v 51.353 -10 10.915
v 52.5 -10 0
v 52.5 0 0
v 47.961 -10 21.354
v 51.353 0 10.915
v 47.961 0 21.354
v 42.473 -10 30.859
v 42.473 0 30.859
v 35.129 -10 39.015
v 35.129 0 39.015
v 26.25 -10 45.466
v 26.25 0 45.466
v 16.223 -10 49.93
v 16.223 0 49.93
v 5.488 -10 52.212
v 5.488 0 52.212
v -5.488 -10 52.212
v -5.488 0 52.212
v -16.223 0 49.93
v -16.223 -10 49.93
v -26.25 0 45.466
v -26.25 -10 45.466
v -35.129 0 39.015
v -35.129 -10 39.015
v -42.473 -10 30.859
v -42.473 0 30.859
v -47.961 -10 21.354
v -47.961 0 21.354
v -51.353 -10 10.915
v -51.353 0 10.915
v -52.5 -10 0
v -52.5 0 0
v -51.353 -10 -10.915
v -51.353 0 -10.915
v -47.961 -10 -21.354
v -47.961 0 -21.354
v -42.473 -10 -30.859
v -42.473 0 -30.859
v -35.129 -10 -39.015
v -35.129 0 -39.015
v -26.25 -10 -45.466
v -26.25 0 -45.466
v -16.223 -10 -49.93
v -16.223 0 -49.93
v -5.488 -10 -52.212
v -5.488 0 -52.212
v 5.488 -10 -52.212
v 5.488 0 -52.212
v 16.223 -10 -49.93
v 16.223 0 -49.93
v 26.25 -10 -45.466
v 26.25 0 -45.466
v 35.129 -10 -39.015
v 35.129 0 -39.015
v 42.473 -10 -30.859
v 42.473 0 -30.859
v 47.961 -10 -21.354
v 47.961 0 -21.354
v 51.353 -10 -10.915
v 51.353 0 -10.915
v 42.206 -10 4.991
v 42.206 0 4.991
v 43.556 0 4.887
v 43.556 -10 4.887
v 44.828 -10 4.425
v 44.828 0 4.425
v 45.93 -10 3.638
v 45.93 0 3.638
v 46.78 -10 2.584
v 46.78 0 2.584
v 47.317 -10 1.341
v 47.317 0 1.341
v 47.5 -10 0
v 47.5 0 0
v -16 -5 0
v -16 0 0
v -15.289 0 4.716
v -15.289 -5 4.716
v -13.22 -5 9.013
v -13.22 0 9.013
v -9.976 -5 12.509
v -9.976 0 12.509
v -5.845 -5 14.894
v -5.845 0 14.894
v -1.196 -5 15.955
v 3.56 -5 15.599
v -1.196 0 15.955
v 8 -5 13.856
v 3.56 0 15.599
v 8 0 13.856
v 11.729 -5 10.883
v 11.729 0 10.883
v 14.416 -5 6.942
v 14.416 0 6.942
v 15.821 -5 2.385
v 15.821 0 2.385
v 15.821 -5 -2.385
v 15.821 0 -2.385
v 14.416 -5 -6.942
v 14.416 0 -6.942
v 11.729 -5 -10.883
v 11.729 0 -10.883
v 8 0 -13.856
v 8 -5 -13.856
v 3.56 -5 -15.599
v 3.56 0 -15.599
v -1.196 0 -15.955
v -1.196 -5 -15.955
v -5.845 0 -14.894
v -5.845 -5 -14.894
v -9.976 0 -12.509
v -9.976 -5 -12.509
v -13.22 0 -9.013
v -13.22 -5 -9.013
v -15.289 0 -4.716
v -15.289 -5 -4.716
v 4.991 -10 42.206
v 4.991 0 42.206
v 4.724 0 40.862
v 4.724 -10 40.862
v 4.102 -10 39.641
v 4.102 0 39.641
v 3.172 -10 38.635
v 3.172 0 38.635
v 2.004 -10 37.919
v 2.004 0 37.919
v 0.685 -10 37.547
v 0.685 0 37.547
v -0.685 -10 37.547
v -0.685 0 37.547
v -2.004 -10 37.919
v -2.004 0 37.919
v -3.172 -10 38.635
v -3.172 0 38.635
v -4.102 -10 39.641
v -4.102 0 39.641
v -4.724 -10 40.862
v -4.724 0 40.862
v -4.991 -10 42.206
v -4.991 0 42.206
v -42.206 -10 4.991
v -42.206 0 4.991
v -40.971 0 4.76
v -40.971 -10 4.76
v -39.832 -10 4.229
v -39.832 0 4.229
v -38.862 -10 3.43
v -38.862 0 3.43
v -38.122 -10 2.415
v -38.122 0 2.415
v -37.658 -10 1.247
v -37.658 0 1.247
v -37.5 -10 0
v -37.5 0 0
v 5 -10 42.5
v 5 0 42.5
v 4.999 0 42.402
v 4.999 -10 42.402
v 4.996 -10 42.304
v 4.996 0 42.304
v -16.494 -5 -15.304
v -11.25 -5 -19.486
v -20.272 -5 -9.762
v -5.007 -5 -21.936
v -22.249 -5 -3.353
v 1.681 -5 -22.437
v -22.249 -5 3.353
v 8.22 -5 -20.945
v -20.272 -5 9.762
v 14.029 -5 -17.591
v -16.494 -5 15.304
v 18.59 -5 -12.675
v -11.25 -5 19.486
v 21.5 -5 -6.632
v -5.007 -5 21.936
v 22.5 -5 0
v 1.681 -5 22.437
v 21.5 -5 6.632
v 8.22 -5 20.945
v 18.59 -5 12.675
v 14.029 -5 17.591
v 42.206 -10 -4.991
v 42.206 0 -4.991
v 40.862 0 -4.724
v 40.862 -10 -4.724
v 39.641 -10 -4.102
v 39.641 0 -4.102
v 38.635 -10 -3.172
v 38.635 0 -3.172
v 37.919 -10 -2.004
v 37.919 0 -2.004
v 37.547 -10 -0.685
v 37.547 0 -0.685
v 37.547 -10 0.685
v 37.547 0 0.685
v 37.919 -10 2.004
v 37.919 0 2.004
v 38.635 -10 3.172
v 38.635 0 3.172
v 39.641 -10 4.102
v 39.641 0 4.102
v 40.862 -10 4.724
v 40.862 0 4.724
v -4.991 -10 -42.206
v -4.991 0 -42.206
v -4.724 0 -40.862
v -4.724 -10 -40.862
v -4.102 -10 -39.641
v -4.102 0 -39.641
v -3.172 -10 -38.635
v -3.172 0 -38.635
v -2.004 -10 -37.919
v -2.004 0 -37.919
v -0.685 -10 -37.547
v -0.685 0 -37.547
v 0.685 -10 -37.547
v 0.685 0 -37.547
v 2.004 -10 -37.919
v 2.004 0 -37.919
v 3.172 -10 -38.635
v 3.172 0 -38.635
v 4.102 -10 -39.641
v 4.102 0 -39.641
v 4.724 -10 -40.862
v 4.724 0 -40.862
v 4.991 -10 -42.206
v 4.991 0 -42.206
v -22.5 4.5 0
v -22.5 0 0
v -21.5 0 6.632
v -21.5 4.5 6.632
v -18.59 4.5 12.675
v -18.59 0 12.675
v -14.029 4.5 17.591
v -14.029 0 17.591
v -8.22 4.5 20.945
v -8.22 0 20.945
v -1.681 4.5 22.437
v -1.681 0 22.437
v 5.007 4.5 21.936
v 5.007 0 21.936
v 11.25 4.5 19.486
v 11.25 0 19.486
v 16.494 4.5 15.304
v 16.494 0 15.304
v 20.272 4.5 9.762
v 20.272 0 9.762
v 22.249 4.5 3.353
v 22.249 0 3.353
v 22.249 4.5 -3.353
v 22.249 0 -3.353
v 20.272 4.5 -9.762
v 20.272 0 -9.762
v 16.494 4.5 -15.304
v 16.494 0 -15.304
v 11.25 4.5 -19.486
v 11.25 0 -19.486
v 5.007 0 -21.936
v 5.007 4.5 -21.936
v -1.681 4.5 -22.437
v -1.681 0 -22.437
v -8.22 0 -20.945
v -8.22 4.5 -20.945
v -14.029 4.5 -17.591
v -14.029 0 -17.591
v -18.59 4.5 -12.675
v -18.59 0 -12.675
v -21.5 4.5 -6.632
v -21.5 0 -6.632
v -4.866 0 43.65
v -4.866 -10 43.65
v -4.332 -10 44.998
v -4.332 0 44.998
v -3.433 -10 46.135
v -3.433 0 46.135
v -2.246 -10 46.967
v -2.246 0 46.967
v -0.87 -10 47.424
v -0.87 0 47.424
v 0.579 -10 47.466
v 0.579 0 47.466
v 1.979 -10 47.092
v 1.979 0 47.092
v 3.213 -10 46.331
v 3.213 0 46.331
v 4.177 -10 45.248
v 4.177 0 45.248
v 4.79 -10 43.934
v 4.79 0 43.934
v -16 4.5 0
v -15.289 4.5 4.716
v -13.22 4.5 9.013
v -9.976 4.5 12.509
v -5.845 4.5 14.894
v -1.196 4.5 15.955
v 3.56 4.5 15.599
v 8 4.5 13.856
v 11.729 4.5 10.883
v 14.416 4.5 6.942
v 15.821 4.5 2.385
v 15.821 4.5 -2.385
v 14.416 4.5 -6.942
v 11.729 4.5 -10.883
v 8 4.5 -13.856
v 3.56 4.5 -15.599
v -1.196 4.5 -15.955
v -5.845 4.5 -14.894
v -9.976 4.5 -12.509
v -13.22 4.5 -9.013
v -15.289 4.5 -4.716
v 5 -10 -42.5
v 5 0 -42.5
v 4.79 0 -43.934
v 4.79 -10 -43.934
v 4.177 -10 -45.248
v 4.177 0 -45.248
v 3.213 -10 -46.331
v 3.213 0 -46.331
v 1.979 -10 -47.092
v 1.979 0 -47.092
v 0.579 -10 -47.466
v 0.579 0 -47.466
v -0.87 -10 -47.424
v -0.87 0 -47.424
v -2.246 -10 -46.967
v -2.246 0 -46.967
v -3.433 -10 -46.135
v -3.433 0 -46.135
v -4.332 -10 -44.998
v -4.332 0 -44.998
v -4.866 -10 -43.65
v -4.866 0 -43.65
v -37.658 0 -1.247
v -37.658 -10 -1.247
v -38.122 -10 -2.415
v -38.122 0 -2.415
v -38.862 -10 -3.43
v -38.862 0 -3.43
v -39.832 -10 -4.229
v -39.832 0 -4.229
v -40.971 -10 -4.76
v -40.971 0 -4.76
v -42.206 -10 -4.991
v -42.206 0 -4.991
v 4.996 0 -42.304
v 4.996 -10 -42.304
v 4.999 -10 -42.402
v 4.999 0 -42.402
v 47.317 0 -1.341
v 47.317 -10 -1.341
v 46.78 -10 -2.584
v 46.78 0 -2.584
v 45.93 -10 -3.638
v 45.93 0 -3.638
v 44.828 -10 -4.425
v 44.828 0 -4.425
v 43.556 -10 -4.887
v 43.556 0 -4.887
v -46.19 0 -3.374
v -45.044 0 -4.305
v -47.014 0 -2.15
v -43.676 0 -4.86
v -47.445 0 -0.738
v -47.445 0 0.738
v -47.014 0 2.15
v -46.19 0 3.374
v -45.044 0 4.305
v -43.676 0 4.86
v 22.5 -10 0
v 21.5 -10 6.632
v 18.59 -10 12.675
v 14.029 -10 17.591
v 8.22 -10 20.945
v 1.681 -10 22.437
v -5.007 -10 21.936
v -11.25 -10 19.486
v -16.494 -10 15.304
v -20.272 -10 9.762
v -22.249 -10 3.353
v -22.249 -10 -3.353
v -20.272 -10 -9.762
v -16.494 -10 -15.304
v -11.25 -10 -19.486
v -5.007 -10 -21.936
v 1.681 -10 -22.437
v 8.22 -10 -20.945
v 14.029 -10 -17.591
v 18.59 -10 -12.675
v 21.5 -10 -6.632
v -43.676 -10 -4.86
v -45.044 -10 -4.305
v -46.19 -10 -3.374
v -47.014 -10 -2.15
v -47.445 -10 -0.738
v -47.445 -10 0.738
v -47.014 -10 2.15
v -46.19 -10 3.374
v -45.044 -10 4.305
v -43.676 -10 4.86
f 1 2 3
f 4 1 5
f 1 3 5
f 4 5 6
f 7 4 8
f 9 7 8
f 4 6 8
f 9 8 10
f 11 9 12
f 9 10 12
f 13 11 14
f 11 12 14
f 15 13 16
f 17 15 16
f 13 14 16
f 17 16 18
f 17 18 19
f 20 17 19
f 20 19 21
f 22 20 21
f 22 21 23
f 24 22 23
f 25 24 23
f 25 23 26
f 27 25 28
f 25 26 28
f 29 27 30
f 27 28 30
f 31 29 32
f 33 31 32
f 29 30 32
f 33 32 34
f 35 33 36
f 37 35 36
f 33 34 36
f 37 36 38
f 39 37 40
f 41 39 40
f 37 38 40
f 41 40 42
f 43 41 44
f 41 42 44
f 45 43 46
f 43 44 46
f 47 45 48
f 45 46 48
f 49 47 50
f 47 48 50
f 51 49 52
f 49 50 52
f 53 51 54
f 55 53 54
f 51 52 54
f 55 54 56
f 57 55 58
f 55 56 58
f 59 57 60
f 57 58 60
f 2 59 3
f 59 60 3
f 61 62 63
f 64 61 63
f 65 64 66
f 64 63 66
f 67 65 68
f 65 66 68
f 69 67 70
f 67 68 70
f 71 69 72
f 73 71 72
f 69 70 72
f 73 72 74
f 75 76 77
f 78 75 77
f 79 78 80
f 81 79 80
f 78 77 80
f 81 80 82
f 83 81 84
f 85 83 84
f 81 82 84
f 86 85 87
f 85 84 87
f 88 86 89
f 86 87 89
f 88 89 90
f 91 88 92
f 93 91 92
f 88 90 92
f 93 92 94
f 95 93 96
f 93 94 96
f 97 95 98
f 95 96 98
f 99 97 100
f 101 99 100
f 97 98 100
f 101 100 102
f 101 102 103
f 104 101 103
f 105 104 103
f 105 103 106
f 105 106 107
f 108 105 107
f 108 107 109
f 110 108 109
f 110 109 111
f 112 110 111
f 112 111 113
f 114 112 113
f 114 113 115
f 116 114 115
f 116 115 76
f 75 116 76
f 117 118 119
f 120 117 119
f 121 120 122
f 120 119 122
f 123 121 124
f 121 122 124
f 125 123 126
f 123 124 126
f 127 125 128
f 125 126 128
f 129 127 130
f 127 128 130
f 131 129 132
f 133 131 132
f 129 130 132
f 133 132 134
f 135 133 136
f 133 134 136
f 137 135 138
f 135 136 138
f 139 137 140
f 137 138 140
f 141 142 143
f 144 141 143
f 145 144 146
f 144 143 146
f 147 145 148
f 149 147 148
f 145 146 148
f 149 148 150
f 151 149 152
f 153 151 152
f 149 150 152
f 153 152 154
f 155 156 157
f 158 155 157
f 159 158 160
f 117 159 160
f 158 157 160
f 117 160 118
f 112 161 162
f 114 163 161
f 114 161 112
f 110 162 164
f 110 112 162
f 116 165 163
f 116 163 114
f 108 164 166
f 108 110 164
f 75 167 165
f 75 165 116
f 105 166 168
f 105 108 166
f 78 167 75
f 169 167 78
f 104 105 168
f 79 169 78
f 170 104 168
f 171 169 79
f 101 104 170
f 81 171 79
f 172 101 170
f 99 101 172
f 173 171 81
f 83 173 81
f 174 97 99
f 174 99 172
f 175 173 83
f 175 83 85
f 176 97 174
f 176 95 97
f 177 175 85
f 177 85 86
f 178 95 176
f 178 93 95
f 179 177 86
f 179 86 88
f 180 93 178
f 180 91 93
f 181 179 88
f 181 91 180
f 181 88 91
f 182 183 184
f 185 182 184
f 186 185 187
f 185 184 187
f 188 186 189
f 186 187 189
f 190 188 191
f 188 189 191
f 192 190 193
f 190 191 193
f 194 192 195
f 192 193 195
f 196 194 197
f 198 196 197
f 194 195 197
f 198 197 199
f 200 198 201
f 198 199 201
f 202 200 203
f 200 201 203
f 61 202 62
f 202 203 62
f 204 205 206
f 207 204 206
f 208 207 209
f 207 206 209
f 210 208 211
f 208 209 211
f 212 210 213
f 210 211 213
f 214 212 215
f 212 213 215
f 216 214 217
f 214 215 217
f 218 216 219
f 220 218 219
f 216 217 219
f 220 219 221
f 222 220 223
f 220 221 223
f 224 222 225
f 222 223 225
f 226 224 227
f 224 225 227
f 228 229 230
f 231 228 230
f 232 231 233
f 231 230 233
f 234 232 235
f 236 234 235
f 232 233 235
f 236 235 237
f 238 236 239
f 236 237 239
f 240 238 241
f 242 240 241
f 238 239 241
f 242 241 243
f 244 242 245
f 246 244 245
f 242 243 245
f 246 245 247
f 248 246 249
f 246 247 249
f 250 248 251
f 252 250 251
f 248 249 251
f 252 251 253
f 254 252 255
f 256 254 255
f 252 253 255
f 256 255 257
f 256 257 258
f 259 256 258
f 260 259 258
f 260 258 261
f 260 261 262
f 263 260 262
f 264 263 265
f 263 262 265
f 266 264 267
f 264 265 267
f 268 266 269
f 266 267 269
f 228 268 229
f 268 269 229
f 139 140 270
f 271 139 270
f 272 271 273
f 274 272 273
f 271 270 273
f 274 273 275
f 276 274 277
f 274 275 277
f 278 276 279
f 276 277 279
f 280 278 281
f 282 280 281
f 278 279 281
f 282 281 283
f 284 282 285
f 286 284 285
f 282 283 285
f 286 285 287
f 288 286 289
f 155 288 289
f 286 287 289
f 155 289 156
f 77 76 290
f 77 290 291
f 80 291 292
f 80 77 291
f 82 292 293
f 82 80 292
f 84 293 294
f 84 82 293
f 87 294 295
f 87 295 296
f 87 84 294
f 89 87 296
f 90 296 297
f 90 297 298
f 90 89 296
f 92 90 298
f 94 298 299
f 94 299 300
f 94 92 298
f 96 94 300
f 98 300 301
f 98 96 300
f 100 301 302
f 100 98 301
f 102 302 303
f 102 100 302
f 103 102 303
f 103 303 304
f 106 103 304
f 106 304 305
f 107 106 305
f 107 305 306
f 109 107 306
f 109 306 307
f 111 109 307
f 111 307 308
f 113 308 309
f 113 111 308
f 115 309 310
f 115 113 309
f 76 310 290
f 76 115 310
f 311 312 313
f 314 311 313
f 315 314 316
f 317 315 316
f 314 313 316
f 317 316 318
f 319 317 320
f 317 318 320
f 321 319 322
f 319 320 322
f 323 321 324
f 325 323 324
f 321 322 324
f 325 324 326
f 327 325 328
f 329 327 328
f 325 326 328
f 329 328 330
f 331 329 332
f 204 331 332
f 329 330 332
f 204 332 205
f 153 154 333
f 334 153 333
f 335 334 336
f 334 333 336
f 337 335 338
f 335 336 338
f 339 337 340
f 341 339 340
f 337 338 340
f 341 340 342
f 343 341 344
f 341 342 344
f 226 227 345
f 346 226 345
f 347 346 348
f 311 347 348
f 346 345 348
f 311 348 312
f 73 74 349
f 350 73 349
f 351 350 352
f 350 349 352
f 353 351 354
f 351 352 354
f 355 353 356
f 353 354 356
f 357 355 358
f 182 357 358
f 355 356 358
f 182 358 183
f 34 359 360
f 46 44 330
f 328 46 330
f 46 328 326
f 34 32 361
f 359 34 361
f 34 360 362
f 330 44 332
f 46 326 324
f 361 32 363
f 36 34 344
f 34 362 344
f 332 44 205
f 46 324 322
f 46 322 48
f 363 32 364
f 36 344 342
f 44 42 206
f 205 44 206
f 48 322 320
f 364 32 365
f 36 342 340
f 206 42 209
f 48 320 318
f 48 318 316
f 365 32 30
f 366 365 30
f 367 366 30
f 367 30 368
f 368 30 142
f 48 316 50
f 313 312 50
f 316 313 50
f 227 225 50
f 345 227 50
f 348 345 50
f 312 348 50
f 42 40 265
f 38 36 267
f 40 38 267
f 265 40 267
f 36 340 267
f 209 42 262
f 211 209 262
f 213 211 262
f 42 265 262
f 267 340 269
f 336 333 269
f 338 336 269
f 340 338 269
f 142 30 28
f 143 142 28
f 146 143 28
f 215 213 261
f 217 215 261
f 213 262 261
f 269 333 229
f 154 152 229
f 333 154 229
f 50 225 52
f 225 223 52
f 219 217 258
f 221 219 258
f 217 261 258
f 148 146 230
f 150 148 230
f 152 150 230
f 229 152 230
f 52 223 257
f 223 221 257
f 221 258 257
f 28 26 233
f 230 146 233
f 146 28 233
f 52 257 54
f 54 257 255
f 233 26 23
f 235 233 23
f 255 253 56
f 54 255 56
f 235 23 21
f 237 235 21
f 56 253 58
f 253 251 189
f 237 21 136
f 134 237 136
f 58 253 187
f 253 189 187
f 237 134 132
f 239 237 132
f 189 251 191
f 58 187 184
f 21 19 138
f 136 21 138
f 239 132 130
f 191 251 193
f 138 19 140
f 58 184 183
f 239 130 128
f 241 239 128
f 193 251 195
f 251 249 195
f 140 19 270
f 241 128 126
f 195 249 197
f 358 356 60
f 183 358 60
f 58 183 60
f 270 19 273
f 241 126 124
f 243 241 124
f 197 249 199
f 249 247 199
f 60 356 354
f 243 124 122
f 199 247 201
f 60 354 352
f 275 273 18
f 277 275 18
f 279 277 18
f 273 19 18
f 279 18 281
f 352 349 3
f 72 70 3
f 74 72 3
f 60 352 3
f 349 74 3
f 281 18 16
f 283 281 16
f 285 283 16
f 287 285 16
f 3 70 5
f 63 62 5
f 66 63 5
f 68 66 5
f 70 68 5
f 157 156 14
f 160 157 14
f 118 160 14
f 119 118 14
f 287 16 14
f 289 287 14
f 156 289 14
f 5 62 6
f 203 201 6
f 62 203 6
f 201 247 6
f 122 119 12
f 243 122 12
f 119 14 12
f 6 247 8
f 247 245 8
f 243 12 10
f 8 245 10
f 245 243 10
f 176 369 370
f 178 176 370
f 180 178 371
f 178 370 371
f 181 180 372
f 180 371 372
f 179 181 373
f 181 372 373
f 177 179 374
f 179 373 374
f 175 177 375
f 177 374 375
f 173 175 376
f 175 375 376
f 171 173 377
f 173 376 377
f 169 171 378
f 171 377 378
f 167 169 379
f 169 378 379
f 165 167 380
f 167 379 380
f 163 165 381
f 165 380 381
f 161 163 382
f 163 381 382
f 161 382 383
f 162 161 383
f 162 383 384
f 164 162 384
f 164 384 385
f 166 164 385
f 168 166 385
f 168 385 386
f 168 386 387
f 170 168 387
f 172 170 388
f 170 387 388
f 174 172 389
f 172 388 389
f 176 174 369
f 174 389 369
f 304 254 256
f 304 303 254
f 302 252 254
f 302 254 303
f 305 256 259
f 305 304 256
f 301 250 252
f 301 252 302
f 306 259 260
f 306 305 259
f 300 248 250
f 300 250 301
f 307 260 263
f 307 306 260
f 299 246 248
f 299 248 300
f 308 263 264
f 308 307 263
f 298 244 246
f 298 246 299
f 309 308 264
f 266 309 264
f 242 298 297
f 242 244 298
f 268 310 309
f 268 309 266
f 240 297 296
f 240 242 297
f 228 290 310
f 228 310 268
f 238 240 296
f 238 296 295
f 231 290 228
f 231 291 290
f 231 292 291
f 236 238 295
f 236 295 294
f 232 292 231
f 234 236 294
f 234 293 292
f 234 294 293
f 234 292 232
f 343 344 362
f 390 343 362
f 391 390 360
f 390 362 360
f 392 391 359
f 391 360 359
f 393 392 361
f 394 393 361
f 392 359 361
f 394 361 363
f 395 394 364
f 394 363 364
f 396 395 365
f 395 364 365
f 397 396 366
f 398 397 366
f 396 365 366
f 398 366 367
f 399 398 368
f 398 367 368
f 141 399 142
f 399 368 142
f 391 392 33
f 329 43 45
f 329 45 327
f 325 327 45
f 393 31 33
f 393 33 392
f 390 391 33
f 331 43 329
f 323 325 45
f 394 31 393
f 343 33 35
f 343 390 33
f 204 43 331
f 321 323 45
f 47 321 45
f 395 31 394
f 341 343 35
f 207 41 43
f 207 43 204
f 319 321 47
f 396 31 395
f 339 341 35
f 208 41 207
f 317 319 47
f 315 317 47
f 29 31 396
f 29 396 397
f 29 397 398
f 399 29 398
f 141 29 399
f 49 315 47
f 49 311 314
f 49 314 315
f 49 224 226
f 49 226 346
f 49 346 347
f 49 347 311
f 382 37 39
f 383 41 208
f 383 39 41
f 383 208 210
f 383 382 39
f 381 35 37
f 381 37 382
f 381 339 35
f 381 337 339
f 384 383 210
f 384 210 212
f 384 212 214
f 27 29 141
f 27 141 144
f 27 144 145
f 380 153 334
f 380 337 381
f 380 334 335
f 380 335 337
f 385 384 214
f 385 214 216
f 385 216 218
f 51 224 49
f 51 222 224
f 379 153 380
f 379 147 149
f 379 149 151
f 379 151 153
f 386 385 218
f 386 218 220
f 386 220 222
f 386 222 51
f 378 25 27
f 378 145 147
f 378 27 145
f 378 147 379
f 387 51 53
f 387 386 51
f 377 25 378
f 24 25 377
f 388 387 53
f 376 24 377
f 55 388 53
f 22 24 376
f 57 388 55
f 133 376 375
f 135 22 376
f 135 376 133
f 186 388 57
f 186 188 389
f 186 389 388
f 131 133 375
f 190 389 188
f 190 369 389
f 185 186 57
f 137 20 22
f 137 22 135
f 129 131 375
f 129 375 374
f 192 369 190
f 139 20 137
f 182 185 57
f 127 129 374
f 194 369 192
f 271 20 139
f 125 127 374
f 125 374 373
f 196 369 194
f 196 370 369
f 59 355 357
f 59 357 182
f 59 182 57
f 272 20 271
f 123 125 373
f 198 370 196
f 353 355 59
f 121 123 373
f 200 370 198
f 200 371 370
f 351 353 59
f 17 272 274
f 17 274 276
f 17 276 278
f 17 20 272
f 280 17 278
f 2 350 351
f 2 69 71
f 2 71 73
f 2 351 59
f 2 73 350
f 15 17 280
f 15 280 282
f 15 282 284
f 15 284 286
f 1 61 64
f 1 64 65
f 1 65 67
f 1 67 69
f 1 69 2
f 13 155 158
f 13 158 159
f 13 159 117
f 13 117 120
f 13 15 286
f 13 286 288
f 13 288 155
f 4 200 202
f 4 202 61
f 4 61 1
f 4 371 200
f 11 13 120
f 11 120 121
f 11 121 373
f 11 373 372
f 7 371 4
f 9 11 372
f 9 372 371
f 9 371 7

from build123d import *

# Parameters (mm, degrees)
F0_R     = 52.5
F1_DEPTH = 10
F2_R     = 22.5
F2_R_2   = 16
F3_DEPTH = 5
F4_R     = 22.5
F4_R_2   = 16
F5_DEPTH = 4.5
F6_R     = 16
F7_DEPTH = 25


with BuildPart() as f1:
    # F0 (on Front) → F1 (new body)
    with BuildSketch(Plane.XZ):
        Circle(F0_R)
        with BuildLine():
            ThreePointArc((4.9913419848, 42.2058823529), (30.0520382004, 30.0520382004), (42.2058823529, 4.9913419848))
            ThreePointArc((42.2058823529, 4.9913419848), (45.9299717029, 3.6380343755), (47.5, 0))
            ThreePointArc((47.5, 0), (45.9299717029, -3.6380343755), (42.2058823529, -4.9913419848))
            ThreePointArc((42.2058823529, -4.9913419848), (30.0520382004, -30.0520382004), (4.9913419848, -42.2058823529))
            ThreePointArc((4.9913419848, -42.2058823529), (4.9978350275, -42.3528774732), (5, -42.5))
            ThreePointArc((5, -42.5), (-0.1471225268, -47.4978350275), (-4.9913419848, -42.2058823529))
            ThreePointArc((-4.9913419848, -42.2058823529), (-30.0520382004, -30.0520382004), (-42.2058823529, -4.9913419848))
            ThreePointArc((-42.2058823529, -4.9913419848), (-47.5, 0), (-42.2058823529, 4.9913419848))
            ThreePointArc((-42.2058823529, 4.9913419848), (-30.0520382004, 30.0520382004), (-4.9913419848, 42.2058823529))
            ThreePointArc((-4.9913419848, 42.2058823529), (-0.1471225268, 47.4978350275), (5, 42.5))
            ThreePointArc((5, 42.5), (4.9978350275, 42.3528774732), (4.9913419848, 42.2058823529))
        make_face(mode=Mode.SUBTRACT)
        with BuildLine():
            ThreePointArc((42.2058823529, -4.9913419848), (37.5, 0), (42.2058823529, 4.9913419848))
            ThreePointArc((42.2058823529, 4.9913419848), (30.0520382004, 30.0520382004), (4.9913419848, 42.2058823529))
            ThreePointArc((4.9913419848, 42.2058823529), (0, 37.5), (-4.9913419848, 42.2058823529))
            ThreePointArc((-4.9913419848, 42.2058823529), (-30.0520382004, 30.0520382004), (-42.2058823529, 4.9913419848))
            ThreePointArc((-42.2058823529, 4.9913419848), (-38.8619656245, 3.4299717029), (-37.5, 0))
            ThreePointArc((-37.5, 0), (-38.8619656245, -3.4299717029), (-42.2058823529, -4.9913419848))
            ThreePointArc((-42.2058823529, -4.9913419848), (-30.0520382004, -30.0520382004), (-4.9913419848, -42.2058823529))
            ThreePointArc((-4.9913419848, -42.2058823529), (0, -37.5), (4.9913419848, -42.2058823529))
            ThreePointArc((4.9913419848, -42.2058823529), (30.0520382004, -30.0520382004), (42.2058823529, -4.9913419848))
        make_face()
    extrude(amount=F1_DEPTH)

    # F2 (on face) → F3 (cut)
    with BuildSketch(Plane.XZ.offset(10)):
        Circle(F2_R)
        Circle(F2_R_2, mode=Mode.SUBTRACT)
        Circle(F2_R_2)
    extrude(amount=-F3_DEPTH, mode=Mode.SUBTRACT)

    # F4 (on face) → F5 (join)
    with BuildSketch(Plane(origin=(0, 0, 0), x_dir=(-1, 0, 0), z_dir=(0, 1, 0))):
        Circle(F4_R)
        Circle(F4_R_2, mode=Mode.SUBTRACT)
    extrude(amount=F5_DEPTH)

    # F6 (on face) → F7 (cut)
    with BuildSketch(Plane(origin=(0, 0, 0), x_dir=(-1, 0, 0), z_dir=(0, 1, 0))):
        Circle(F6_R)
    extrude(amount=-F7_DEPTH, mode=Mode.SUBTRACT)


solid = f1.part
